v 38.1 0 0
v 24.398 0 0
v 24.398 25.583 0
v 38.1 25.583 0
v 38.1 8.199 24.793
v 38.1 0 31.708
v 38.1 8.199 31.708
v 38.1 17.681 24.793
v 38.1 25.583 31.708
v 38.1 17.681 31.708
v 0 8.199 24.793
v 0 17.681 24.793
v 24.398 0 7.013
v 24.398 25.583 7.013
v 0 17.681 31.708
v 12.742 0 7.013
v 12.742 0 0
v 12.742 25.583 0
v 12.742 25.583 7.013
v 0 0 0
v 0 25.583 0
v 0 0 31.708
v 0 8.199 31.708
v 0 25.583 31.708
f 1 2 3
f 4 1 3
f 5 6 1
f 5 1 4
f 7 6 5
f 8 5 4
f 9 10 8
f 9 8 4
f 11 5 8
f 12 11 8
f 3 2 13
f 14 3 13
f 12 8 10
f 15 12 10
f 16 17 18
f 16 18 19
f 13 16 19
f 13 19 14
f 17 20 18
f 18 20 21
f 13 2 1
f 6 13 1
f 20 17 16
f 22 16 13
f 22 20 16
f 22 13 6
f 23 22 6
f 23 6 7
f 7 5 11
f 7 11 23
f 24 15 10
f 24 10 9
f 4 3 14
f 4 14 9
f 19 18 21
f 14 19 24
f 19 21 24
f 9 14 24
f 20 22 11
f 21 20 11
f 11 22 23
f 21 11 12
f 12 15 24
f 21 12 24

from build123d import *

# Parameters (mm, degrees)
F0_W     = 25.5834441632
F0_H     = 31.7076668143
F1_DEPTH = 38.1
F2_W     = 9.4826659188
F2_H     = 6.9144461304
F3_DEPTH = 38.1
F4_W     = 11.6557758301
F4_H     = 7.0132222027
F5_DEPTH = 38.1


with BuildPart() as f1:
    # F0 (on Right) → F1 (new body)
    with BuildSketch(Plane.YZ):
        with Locations((12.7917220816, 15.8538334072)):
            Rectangle(F0_W, F0_H)
    extrude(amount=F1_DEPTH)

    # F2 (on face) → F3 (cut)
    with BuildSketch(Plane.YZ.offset(38.1)):
        with Locations((12.9398894496, 28.2504437491)):
            Rectangle(F2_W, F2_H)
    extrude(amount=-F3_DEPTH, mode=Mode.SUBTRACT)

    # F4 (on face) → F5 (cut)
    with BuildSketch(Plane.XZ):
        with Locations((18.5702228919, 3.5066111013)):
            Rectangle(F4_W, F4_H)
    extrude(amount=-F5_DEPTH, mode=Mode.SUBTRACT)


solid = f1.part
